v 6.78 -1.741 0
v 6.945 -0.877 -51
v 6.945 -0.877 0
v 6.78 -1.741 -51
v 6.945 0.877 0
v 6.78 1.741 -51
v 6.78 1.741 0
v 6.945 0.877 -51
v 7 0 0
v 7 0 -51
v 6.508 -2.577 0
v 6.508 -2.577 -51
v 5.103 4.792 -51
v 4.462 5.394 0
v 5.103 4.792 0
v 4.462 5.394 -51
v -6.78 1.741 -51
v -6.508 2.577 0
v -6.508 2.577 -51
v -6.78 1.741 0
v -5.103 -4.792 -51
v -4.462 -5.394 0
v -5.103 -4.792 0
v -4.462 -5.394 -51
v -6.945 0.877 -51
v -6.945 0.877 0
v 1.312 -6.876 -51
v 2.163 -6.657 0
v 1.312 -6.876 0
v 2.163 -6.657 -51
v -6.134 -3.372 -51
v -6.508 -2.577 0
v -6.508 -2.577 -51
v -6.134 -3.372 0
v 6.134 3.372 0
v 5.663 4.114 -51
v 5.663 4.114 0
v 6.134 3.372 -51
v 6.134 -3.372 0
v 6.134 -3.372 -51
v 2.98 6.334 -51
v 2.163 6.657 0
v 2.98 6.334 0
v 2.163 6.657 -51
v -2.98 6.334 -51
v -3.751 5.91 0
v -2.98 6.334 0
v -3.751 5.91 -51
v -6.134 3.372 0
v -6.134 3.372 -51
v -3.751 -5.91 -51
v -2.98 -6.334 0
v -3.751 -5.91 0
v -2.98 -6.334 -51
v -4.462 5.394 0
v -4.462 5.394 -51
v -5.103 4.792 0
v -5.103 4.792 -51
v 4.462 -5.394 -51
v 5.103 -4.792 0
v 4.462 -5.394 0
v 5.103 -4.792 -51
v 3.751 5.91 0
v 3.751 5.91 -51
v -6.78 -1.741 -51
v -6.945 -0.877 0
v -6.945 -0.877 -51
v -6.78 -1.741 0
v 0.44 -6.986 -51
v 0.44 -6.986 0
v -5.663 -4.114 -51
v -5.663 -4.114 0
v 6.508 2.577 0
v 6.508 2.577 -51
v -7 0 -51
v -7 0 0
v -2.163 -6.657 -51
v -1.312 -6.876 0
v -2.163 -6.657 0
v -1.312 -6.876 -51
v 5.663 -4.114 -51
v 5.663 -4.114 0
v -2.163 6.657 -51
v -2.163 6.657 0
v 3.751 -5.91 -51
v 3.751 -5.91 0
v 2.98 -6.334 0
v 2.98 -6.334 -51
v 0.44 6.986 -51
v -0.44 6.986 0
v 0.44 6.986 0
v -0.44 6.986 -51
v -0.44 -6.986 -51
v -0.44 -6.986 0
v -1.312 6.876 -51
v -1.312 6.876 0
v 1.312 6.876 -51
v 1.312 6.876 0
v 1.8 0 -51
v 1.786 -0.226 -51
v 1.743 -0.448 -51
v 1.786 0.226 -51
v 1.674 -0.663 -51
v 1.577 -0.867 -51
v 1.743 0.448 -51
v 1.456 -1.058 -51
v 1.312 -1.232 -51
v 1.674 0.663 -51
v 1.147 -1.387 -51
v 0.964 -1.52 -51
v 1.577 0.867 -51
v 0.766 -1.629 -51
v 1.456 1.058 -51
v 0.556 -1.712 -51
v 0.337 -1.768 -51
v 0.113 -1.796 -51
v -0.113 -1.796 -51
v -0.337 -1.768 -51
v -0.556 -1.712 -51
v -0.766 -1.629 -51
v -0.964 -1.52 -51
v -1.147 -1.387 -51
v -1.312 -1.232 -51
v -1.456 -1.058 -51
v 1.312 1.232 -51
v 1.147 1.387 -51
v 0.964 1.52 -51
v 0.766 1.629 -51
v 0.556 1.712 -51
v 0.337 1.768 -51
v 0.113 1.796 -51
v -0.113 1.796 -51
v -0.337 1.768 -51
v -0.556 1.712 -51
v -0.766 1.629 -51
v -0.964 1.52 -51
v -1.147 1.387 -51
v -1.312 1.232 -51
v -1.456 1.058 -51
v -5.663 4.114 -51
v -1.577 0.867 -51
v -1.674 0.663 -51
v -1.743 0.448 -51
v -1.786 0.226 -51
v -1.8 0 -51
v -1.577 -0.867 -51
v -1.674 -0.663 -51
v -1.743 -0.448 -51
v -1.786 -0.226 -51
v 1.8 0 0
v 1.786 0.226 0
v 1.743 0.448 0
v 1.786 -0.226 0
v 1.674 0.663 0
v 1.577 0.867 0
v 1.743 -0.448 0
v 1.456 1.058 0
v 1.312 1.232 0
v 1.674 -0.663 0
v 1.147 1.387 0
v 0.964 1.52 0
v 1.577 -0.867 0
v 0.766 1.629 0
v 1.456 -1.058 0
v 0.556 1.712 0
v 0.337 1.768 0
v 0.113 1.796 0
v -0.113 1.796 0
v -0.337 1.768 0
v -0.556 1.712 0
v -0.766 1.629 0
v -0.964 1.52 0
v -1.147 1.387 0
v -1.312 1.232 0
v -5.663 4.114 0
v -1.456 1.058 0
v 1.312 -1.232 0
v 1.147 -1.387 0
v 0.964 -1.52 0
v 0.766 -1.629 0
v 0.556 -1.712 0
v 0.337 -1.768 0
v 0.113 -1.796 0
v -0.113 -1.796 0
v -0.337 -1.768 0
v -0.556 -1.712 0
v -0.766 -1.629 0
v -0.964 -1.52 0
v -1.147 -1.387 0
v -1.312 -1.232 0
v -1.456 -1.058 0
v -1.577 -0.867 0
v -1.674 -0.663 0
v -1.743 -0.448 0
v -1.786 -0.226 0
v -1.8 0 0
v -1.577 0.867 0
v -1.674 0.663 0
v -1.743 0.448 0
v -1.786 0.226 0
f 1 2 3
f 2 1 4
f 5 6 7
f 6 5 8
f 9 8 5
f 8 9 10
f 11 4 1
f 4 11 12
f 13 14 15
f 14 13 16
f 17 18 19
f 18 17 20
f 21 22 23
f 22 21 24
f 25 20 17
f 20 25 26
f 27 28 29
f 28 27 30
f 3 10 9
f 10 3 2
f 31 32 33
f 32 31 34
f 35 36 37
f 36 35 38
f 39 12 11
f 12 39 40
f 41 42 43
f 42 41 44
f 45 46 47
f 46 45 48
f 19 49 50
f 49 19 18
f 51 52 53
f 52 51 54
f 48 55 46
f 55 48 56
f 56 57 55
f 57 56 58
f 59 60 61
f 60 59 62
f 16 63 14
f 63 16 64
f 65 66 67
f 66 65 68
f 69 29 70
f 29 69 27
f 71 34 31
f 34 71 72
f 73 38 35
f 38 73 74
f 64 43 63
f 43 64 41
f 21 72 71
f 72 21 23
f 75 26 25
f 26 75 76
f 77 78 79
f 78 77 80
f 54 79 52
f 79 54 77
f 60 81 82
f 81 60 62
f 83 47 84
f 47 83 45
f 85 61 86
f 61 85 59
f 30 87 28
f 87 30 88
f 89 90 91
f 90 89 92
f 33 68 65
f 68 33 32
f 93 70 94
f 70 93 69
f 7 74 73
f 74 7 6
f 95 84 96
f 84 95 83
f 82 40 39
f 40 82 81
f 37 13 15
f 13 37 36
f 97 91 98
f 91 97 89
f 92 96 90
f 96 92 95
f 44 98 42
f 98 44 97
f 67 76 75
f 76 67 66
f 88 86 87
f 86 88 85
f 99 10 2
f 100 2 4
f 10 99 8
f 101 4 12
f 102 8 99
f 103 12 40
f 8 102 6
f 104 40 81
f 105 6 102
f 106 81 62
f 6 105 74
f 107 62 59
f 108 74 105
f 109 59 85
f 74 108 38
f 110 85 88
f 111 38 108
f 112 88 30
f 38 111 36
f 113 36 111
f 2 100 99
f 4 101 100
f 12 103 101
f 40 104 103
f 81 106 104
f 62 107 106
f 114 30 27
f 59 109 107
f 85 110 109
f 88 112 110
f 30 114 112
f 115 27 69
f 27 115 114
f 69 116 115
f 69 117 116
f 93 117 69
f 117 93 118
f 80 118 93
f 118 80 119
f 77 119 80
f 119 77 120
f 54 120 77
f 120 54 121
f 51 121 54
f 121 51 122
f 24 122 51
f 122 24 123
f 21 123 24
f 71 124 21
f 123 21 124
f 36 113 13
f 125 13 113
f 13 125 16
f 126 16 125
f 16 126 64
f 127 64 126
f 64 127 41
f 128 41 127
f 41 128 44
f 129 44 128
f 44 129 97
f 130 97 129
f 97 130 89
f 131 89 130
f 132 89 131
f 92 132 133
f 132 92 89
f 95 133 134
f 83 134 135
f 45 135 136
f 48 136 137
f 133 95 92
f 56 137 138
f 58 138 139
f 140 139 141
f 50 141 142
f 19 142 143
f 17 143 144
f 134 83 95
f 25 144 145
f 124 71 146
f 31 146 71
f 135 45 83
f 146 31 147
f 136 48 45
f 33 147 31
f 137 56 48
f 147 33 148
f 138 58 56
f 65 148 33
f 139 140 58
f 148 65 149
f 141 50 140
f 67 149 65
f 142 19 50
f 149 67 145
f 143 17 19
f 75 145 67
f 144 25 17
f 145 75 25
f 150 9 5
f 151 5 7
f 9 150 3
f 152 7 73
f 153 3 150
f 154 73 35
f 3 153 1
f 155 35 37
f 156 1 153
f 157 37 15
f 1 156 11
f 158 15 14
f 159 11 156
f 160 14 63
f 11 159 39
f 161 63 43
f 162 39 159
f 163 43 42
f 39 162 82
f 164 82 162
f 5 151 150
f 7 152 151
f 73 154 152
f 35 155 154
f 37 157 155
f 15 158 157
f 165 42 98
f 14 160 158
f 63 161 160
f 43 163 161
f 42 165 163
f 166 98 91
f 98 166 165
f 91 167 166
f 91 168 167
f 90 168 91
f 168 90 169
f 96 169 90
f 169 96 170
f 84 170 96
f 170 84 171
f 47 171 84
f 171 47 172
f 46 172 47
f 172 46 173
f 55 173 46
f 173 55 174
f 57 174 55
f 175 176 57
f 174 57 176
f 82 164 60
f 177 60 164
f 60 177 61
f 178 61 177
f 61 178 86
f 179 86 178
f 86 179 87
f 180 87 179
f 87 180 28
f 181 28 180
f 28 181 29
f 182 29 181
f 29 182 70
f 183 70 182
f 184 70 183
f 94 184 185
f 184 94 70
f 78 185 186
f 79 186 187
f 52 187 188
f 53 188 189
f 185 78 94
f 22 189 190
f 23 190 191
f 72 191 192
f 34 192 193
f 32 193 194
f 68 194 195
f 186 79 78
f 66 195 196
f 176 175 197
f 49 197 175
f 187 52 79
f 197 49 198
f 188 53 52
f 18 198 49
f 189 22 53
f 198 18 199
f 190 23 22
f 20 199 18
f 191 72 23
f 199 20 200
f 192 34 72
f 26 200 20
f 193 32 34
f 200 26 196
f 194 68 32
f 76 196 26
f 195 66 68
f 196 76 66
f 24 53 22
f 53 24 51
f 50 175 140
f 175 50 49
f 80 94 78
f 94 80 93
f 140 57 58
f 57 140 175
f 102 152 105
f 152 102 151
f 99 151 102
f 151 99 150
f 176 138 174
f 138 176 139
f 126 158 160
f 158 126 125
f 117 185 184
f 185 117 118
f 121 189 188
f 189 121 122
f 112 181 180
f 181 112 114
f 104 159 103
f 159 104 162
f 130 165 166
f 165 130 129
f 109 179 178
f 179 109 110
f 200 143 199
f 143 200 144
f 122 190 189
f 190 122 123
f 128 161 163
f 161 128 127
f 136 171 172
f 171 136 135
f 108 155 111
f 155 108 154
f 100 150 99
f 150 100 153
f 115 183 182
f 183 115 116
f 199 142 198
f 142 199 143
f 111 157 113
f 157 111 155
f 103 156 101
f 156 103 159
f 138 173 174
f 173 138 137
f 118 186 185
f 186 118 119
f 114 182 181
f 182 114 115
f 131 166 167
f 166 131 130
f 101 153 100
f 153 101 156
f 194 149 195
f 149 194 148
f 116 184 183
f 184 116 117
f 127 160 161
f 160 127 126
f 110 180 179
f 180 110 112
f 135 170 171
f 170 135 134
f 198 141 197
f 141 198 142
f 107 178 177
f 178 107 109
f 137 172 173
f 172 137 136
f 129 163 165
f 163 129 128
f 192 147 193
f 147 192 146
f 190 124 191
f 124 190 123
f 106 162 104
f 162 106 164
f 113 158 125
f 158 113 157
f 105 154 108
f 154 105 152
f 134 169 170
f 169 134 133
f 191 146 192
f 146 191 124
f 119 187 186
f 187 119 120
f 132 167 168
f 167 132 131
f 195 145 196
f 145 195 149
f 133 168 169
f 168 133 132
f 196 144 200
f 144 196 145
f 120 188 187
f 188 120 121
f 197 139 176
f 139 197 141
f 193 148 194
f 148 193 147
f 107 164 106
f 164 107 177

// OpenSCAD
$fn = 50;


difference() {
	union() {
		translate(v = [0, 0, -51.0000000000]) {
			cylinder(h = 51, r = 7.0000000000);
		}
		cylinder(h = 0, r = 16.0000000000);
	}
	union() {
		#translate(v = [0, 0, -51]) {
			cylinder(h = 51, r = 1.8000000000);
		}
	}
}
